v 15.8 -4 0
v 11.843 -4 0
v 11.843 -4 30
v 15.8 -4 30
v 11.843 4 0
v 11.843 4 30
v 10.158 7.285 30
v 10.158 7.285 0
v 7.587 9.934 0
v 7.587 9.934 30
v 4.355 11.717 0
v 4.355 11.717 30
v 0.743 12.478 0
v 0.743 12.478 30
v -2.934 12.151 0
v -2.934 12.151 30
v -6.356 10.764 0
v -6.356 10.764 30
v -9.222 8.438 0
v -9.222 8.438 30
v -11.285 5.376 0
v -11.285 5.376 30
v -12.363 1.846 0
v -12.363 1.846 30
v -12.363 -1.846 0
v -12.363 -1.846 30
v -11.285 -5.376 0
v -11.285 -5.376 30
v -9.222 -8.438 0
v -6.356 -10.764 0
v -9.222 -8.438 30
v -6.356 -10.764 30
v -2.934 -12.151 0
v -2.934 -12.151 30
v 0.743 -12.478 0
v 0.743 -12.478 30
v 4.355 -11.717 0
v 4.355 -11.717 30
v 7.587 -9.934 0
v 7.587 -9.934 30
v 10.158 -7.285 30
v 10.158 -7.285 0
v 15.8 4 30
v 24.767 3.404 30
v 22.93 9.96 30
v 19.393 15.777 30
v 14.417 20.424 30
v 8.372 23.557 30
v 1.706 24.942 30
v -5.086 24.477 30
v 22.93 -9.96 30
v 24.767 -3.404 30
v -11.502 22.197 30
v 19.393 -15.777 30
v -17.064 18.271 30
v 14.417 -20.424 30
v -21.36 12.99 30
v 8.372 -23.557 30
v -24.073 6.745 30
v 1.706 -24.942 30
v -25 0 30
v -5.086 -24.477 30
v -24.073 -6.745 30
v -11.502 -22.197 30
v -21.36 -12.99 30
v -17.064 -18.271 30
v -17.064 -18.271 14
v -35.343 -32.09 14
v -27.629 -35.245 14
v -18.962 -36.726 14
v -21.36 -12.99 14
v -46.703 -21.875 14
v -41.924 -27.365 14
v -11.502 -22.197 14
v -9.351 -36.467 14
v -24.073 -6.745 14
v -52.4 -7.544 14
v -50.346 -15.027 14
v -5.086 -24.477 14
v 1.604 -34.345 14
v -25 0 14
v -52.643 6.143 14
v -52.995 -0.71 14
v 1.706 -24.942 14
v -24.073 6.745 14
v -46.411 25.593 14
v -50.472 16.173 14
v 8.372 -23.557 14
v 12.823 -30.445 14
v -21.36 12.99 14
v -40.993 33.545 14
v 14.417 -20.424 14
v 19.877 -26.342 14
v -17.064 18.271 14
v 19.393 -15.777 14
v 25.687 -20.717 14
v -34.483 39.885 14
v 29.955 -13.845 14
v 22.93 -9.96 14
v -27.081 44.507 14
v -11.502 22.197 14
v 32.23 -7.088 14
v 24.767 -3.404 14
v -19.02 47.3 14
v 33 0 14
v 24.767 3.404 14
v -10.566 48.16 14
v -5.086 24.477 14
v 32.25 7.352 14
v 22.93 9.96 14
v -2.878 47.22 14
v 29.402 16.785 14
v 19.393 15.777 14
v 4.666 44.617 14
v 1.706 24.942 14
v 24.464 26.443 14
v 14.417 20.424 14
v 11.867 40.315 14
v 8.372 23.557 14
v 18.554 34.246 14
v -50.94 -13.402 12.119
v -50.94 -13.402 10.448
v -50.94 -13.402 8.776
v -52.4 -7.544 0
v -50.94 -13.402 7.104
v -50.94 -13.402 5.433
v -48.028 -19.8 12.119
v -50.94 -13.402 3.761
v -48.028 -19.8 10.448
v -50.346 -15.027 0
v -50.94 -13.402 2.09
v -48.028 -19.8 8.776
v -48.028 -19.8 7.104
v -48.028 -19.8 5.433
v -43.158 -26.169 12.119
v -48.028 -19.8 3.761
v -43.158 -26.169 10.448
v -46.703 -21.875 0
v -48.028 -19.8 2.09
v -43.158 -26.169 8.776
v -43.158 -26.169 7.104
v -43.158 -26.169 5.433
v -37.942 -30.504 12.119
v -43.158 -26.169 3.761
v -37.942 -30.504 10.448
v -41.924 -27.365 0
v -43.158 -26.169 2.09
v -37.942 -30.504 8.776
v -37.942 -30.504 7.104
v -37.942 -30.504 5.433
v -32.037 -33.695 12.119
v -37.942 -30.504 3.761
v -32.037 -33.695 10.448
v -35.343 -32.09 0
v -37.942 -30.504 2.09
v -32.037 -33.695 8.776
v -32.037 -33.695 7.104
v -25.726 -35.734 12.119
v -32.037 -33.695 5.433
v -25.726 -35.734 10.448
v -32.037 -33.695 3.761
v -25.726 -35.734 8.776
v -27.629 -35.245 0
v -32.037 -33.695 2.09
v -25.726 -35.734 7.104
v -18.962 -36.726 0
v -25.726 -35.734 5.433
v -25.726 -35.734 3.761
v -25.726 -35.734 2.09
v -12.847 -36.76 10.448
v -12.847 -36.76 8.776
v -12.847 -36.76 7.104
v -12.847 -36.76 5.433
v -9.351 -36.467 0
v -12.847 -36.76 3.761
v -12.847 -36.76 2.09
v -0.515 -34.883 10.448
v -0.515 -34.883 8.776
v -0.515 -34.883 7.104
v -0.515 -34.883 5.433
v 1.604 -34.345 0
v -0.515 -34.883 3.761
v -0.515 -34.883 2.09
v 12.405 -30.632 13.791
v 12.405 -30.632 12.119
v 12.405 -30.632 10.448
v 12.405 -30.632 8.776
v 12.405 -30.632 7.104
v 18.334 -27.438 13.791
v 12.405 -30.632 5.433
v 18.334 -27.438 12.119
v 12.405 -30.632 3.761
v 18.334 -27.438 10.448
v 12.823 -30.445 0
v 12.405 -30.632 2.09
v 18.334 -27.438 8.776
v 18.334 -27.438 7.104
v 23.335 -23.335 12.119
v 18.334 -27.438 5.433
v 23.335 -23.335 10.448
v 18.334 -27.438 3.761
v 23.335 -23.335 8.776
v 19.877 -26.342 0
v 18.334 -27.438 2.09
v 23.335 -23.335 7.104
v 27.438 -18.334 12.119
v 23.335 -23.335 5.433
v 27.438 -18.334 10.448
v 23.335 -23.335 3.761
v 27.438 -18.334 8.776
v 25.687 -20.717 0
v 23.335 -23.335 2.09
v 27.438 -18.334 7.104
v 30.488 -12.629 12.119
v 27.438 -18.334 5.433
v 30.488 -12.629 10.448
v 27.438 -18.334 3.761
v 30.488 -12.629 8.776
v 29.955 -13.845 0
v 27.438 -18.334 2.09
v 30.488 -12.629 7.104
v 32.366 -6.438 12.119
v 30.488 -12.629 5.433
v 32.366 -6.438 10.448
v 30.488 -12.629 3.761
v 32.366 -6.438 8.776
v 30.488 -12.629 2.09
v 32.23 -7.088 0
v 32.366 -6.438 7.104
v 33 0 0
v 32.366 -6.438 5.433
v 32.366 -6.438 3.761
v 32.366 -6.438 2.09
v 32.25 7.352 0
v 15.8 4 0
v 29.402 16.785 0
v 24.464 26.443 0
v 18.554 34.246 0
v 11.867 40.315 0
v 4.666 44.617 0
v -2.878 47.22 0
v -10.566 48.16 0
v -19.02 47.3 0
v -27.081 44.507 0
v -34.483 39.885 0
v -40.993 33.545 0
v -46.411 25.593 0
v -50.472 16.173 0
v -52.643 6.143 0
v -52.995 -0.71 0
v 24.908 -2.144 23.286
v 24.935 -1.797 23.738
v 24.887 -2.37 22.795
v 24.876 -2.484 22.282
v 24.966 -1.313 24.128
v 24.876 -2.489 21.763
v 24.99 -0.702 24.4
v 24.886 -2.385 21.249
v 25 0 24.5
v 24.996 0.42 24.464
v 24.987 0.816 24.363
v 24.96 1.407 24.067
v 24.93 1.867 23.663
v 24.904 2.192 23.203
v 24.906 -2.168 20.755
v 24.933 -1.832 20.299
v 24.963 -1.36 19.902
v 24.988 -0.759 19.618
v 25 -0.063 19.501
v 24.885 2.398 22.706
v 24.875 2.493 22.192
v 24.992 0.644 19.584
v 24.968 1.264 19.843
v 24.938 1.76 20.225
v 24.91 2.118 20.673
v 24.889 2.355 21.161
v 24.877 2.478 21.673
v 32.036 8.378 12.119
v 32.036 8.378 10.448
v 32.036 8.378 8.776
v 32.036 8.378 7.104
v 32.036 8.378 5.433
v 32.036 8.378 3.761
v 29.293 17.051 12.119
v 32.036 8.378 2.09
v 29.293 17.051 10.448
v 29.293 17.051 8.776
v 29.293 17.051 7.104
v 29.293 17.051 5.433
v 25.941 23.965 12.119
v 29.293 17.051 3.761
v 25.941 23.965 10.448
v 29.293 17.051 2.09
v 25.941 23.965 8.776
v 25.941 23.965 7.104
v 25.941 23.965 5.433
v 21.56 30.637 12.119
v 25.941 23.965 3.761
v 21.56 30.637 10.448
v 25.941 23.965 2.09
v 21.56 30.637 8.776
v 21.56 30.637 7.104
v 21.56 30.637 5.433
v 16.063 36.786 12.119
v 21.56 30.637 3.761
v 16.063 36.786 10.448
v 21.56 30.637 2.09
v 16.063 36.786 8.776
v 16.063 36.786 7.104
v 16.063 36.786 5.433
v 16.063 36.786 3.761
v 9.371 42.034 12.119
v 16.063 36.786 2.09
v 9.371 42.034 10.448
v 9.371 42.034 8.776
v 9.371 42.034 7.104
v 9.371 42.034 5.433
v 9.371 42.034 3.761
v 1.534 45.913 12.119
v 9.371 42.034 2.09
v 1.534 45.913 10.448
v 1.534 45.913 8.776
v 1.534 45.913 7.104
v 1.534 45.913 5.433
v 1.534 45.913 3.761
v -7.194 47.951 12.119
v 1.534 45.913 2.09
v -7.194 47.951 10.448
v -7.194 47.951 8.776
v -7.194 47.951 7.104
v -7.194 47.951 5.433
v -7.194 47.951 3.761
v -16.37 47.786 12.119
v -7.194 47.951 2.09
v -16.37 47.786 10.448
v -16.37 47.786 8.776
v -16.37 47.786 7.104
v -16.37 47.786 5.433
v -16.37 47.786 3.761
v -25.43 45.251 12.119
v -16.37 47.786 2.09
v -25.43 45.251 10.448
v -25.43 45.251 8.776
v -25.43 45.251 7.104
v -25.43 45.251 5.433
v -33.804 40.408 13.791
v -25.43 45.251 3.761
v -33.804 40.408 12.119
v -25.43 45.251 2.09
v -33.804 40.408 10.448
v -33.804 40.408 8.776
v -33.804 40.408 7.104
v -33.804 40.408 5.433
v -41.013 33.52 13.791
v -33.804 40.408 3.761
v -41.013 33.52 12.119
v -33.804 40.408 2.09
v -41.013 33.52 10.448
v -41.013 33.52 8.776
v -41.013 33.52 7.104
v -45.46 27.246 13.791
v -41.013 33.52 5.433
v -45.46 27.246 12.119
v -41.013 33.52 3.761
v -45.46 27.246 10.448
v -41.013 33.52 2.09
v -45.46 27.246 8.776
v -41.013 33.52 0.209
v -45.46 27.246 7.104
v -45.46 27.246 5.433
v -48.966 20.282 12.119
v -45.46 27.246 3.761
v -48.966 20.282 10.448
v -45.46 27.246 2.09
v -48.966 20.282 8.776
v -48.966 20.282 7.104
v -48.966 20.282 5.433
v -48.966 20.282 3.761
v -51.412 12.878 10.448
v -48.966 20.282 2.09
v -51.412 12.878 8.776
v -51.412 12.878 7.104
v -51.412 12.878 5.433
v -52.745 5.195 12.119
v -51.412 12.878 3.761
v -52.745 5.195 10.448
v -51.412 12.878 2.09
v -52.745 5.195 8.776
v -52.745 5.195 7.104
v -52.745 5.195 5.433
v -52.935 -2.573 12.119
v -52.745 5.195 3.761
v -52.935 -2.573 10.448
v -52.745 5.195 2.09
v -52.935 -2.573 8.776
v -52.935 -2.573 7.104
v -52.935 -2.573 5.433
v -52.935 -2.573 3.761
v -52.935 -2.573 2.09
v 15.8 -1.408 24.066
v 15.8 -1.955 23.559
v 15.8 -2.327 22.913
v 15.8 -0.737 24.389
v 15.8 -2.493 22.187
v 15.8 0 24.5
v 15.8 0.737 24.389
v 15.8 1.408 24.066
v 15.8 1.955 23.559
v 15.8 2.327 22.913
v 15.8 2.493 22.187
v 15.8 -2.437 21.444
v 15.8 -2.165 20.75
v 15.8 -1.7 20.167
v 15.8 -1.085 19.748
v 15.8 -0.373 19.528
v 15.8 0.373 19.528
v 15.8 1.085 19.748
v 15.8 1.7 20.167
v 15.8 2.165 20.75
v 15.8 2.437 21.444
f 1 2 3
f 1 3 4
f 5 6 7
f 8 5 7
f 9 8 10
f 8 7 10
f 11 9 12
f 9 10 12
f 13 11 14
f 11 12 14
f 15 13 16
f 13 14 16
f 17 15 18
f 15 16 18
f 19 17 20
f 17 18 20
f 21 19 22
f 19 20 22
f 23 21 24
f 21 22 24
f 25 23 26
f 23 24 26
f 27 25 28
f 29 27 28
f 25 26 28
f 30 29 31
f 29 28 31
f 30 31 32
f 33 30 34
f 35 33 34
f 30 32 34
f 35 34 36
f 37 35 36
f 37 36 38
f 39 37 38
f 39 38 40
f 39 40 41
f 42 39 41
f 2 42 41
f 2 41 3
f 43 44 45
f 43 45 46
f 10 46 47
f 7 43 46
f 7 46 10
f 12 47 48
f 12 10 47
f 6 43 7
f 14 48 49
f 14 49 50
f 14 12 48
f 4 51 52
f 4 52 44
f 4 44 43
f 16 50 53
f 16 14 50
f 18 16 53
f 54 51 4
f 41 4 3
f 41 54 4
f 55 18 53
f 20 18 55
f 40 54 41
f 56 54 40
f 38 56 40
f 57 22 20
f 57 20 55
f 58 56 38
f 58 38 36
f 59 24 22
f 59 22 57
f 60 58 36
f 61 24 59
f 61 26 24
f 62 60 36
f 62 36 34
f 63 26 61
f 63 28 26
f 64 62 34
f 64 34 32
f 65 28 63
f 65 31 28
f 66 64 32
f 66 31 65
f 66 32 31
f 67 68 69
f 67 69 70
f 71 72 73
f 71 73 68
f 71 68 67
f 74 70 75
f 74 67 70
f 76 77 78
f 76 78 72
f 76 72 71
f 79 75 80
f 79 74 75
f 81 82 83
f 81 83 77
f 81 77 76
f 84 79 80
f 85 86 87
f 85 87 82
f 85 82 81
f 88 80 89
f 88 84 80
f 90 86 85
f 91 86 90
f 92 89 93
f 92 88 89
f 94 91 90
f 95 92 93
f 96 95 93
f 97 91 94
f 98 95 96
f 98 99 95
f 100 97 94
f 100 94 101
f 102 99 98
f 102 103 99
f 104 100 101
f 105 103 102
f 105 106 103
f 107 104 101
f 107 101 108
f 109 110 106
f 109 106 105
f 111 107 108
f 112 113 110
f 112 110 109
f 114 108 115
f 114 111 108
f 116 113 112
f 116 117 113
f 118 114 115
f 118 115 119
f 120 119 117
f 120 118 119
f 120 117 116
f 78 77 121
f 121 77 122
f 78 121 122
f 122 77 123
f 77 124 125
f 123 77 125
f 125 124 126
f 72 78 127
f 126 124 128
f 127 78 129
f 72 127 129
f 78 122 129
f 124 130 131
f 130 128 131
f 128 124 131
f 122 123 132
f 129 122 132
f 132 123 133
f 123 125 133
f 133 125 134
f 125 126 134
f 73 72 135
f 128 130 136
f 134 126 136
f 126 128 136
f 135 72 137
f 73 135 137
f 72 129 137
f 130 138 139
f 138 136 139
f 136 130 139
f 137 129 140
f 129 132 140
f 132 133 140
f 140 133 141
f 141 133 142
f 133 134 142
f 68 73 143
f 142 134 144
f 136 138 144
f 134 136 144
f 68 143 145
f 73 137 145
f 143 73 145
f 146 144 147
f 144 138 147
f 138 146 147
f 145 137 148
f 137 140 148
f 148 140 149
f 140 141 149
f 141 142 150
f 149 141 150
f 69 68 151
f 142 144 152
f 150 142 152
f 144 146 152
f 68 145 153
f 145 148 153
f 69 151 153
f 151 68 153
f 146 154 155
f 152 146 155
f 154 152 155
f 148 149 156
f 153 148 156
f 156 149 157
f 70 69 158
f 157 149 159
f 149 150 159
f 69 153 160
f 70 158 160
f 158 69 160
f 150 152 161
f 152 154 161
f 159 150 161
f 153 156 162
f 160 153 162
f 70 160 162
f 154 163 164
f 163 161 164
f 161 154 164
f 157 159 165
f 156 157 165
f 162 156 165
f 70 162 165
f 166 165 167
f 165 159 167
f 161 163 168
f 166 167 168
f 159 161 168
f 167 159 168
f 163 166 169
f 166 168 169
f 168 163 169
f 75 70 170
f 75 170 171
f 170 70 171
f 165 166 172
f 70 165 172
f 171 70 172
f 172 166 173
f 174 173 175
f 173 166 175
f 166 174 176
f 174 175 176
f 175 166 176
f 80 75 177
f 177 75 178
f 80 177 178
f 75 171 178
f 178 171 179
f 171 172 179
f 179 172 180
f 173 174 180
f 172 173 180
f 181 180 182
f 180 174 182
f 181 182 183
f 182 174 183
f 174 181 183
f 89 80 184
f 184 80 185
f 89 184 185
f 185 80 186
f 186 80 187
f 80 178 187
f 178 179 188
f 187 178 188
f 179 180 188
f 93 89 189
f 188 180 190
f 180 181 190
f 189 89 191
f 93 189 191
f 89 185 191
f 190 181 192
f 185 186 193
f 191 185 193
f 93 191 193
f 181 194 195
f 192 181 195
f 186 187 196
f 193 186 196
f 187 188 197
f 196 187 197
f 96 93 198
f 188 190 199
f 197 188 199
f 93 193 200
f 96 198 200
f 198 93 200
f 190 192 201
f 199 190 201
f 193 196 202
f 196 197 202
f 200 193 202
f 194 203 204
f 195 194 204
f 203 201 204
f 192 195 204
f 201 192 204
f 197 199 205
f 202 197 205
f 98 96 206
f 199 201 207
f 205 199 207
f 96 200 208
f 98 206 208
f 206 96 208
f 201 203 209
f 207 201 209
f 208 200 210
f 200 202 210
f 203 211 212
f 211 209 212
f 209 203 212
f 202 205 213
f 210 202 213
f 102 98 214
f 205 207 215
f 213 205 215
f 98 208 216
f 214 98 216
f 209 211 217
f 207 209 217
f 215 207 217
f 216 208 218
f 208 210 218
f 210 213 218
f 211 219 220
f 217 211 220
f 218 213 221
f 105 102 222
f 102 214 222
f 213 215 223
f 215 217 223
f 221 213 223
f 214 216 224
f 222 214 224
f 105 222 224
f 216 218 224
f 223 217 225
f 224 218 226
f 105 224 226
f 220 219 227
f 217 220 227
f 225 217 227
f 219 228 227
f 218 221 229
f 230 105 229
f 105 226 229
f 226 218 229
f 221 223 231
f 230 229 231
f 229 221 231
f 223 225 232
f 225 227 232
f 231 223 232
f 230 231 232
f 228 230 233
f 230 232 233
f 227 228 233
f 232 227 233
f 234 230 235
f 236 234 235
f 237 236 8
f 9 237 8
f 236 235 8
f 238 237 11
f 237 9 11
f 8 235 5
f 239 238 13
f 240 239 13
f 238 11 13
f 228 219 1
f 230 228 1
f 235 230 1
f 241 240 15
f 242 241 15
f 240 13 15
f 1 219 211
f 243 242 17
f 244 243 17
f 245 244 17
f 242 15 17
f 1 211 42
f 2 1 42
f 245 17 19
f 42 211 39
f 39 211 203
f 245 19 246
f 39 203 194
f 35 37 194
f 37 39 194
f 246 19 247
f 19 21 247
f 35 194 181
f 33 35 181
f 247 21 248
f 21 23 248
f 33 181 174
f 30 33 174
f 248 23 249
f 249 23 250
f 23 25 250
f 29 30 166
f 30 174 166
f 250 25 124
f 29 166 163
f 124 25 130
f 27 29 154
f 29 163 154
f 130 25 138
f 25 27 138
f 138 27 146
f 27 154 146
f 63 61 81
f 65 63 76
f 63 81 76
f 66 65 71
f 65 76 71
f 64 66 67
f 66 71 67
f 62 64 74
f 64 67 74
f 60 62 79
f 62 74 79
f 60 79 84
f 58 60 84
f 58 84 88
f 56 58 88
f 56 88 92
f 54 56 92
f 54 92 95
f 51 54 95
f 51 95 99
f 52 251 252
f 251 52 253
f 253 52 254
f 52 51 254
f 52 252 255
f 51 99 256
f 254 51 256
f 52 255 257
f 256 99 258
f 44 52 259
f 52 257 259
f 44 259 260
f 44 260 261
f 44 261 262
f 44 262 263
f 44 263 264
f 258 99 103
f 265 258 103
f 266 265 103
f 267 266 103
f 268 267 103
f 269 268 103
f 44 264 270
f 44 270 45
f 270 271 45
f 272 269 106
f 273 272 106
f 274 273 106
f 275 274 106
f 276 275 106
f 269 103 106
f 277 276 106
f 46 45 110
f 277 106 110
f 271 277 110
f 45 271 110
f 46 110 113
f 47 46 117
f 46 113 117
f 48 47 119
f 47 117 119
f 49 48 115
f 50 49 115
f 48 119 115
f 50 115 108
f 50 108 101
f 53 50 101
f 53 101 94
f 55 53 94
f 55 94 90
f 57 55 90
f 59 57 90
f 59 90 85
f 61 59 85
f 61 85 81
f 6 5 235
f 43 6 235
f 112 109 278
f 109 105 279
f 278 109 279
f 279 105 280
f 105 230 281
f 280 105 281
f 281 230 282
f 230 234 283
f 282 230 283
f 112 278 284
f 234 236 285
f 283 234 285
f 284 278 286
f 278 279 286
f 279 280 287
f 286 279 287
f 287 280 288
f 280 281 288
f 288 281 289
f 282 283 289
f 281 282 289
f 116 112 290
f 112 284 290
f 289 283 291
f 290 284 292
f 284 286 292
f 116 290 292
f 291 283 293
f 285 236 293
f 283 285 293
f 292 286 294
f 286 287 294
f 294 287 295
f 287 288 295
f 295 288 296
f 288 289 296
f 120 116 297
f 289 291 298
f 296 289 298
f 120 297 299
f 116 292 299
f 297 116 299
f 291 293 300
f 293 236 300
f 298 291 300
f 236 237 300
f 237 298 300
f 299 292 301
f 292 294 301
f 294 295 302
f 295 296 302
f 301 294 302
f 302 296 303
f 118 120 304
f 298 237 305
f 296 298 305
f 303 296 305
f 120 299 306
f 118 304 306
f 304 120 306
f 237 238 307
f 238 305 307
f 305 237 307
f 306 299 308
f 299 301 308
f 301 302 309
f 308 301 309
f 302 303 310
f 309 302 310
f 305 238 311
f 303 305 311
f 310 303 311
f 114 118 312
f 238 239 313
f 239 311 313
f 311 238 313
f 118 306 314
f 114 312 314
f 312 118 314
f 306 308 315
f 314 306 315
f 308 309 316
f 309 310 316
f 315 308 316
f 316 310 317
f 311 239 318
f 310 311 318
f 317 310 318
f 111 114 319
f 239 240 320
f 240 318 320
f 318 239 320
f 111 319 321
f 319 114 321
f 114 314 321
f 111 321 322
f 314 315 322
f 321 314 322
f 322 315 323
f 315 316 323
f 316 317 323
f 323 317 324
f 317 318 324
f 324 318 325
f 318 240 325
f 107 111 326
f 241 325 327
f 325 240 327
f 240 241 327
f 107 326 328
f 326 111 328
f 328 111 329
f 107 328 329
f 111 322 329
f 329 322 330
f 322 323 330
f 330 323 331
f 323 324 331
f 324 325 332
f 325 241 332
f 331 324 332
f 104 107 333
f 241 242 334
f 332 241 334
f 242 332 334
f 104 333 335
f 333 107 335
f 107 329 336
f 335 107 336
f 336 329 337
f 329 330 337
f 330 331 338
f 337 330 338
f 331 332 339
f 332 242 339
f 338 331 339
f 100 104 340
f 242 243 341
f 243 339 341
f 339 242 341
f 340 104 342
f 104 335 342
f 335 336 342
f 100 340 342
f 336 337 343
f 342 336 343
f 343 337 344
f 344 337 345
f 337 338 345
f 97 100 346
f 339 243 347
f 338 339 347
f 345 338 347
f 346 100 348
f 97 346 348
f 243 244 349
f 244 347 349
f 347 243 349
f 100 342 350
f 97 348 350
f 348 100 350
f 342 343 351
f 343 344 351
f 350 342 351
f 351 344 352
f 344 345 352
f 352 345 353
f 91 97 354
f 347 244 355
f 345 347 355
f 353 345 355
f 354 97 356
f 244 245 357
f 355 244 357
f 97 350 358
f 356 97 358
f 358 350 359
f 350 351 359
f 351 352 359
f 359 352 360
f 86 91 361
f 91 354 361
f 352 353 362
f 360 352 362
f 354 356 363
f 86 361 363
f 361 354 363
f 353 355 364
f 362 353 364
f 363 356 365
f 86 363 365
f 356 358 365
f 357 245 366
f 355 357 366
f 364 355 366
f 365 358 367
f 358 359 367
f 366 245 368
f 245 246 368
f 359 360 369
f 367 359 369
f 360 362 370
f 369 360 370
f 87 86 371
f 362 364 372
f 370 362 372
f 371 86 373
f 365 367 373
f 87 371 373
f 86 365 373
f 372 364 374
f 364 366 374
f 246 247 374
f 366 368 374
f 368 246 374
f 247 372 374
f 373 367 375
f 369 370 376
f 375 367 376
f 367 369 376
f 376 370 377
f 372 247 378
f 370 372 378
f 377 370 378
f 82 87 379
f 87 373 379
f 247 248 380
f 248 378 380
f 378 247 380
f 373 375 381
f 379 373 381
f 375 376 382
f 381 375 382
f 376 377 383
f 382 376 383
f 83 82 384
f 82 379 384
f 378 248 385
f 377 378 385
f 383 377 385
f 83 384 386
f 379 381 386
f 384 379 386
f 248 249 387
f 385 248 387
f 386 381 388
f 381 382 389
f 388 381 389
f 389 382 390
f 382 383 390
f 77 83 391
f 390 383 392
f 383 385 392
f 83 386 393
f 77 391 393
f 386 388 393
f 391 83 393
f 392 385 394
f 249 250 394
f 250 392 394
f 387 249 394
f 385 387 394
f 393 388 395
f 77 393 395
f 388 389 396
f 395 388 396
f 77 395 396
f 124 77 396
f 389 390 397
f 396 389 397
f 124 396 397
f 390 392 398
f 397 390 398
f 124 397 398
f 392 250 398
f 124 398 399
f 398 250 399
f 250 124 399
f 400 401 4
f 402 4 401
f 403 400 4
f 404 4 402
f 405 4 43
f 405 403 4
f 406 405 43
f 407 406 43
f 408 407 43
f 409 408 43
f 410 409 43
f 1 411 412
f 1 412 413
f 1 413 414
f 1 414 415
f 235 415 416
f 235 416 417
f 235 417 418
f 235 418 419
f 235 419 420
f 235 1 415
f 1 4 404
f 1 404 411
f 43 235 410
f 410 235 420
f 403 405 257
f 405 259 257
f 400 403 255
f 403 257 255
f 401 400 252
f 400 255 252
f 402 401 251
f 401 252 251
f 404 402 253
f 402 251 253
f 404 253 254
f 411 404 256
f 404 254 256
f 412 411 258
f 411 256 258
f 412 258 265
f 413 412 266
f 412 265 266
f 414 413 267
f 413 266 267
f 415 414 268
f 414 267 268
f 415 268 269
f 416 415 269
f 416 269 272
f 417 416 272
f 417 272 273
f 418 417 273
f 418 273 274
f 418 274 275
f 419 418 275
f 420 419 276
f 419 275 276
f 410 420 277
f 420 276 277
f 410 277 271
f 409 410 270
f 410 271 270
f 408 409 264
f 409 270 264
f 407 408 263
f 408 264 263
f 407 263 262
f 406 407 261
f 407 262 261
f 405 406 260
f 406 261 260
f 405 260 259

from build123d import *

# Parameters (mm, degrees)
EXTRUDE_1_DEPTH     = 14
SKETCH_2_R          = 25
EXTRUDE_2_DEPTH     = 30
SKETCH_3_R          = 12.5
CUT_EXTRUDE_1_DEPTH = 78.64562782
SWEEP_2_PROFILE_R   = 2.5
SKETCH_8_W          = 15.8
SKETCH_8_H          = 8
CUT_EXTRUDE_3_DEPTH = 78.64562782


with BuildPart() as part:
    # 草图1 → 凸台-拉伸1 (new body)
    with BuildSketch(Plane.XY):
        with BuildLine():
            add(Edge.make_bspline(
                [(33, 0), (32.992204895, 0.544666729), (32.976480109, 1.643403319), (32.853064931, 3.301727765), (32.658915426, 4.980879695), (32.388196689, 6.677537715), (32.044944958, 8.388606268), (31.630570565, 10.111165253), (31.147186794, 11.842433965), (30.596568938, 13.57971361), (29.98033344, 15.320337013), (29.299789777, 17.061615147), (28.555887029, 18.800784535), (27.749173646, 20.534967231), (26.879751228, 22.261119957), (25.947286594, 23.976001144), (24.951020471, 25.676125073), (23.889814679, 27.35772059), (22.762223009, 29.016688558), (21.566586312, 30.648565024), (20.301138192, 32.248479161), (18.964127555, 33.81112609), (17.553956129, 35.330754232), (16.069306796, 36.801162963), (14.509273248, 38.215722303), (12.873484417, 39.567416225), (11.162207045, 40.848898292), (9.376441015, 42.052578226), (7.517986505, 43.170717712), (5.589490091, 44.195539218), (3.594469744, 45.119346278), (1.53731504, 45.934646153), (-0.576735961, 46.634276616), (-2.74164203, 47.211518041), (-4.950619716, 47.660204084), (-7.196219851, 47.974828288), (-9.470422571, 48.150607487), (-11.76473259, 48.183580117), (-14.070288761, 48.070629868), (-16.377971366, 47.809547695), (-18.67851562, 47.399040683), (-20.96262116, 46.838742341), (-23.221064088, 46.12921357), (-25.444800735, 45.271912976), (-27.625072088, 44.269170741), (-29.753502784, 43.124146476), (-31.822186889, 41.840759247), (-33.823775568, 40.423630812), (-35.751543622, 38.877994203), (-37.599456194, 37.209613013), (-39.362201277, 35.424668235), (-41.035231852, 33.529668236), (-42.614754199, 31.53132517), (-44.09777446, 29.436479773), (-45.481085646, 27.253115728), (-46.760721786, 24.993714386), (-47.930689696, 22.669528818), (-48.985280232, 20.290366962), (-49.921879744, 17.86233444), (-50.73821056, 15.391267947), (-51.432305812, 12.8831224), (-52.002502766, 10.343940159), (-52.447402955, 7.779839842), (-52.766015438, 5.196990334), (-52.957281079, 2.601648936), (-53.021584789, 0.009188241), (-52.95682309, -2.556762808), (-52.768752296, -5.077096398), (-52.522148692, -6.726622939), (-52.399929, -7.544148)],
                knots=[0, 0, 0, 0, 0.010895628, 0.021979359, 0.033249847, 0.044704843, 0.056341204, 0.068154912, 0.080141086, 0.092294104, 0.104607701, 0.11707519, 0.129689707, 0.14244447, 0.155333078, 0.168349762, 0.181489545, 0.194748369, 0.208123105, 0.221611441, 0.235211792, 0.248923032, 0.26274432, 0.276674885, 0.290713819, 0.304859987, 0.319111923, 0.333467808, 0.347925543, 0.362482829, 0.377137264, 0.391886521, 0.406728484, 0.421661423, 0.436684102, 0.451795886, 0.466996829, 0.482287719, 0.497670025, 0.513145895, 0.528718049, 0.54438967, 0.560164277, 0.576045576, 0.592037302, 0.608143104, 0.624366387, 0.640710242, 0.657177353, 0.673769958, 0.690489849, 0.70733837, 0.724316458, 0.741424727, 0.758663496, 0.776003856, 0.793351474, 0.810699088, 0.828046707, 0.845394323, 0.862741936, 0.880089557, 0.897437174, 0.914784793, 0.932132405, 0.949480024, 0.966642526, 0.983467637, 1, 1, 1, 1], degree=3))
            add(Edge.make_bspline(
                [(-52.399929, -7.544148), (-52.251447511, -8.344449933), (-51.956477891, -9.93430977), (-51.431378847, -11.881327743), (-50.946615492, -13.402352601), (-50.547774852, -14.520833098), (-50.113968755, -15.61972104), (-49.645210909, -16.698158038), (-49.141976069, -17.755310038), (-48.604716766, -18.790320175), (-48.033993716, -19.80233339), (-47.430434687, -20.790495875), (-46.794737646, -21.753963168), (-46.127681435, -22.691905033), (-45.430091118, -23.603527112), (-44.461690461, -24.78142675), (-43.179240858, -26.184980253), (-41.532569131, -27.753864704), (-39.788936475, -29.201085533), (-37.95827815, -30.522875718), (-36.050936512, -31.716585493), (-34.077553488, -32.780697635), (-32.048834528, -33.714886161), (-29.975350706, -34.520036776), (-27.867326416, -35.19822348), (-25.734442747, -35.752653633), (-23.585659114, -36.187574089), (-21.429063355, -36.50814968), (-19.27176002, -36.720310246), (-17.119804246, -36.830595085), (-14.978186003, -36.845970949), (-12.850873113, -36.773654705), (-10.740913687, -36.620937922), (-8.650597875, -36.395022526), (-6.581674525, -36.102863407), (-4.535611161, -35.751026937), (-2.513887786, -35.345556209), (-0.518293788, -34.891856115), (1.448781863, -34.394574738), (3.384105738, -33.857530642), (5.283395004, -33.283637208), (7.141181014, -32.67491492), (8.950717416, -32.03256093), (10.703916152, -31.357116), (12.391331701, -30.648817619), (14.002048983, -29.907900792), (15.525340793, -29.134972637), (16.967203751, -28.319820567), (18.341157037, -27.449470169), (19.665980256, -26.516508819), (20.943385245, -25.51958757), (22.170348028, -24.461209886), (23.343896741, -23.343896621), (24.461208994, -22.170347615), (25.519591016, -20.943387015), (26.516495927, -19.665973587), (27.449518295, -18.341181942), (28.316413718, -16.972205388), (29.115091885, -15.562340777), (29.843629808, -14.114985263), (30.500271052, -12.633625806), (31.083435636, -11.121830348), (31.591710671, -9.583242061), (32.023907296, -8.021566688), (32.37884622, -6.440566847), (32.656192002, -4.844051032), (32.853335771, -3.23586502), (32.977041039, -1.619883695), (32.992347014, -0.539961135), (33, 0)],
                knots=[0, 0, 0, 0, 0.020431005, 0.040587725, 0.050576924, 0.060511834, 0.070396638, 0.08023526, 0.09003139, 0.099788458, 0.109509648, 0.119197921, 0.128855969, 0.138486254, 0.14809097, 0.157672096, 0.176767364, 0.195785952, 0.214735199, 0.233619037, 0.252438345, 0.271191379, 0.289874288, 0.308481685, 0.327007235, 0.345444275, 0.363786425, 0.382028051, 0.400164732, 0.418193505, 0.436112913, 0.453922863, 0.47162413, 0.489217593, 0.50670321, 0.524078705, 0.54133817, 0.558470582, 0.575458641, 0.592277781, 0.60889569, 0.625272245, 0.641359738, 0.657103167, 0.672440382, 0.687301883, 0.701610051, 0.715317718, 0.728874017, 0.74243031, 0.75598661, 0.769542915, 0.783099211, 0.796655507, 0.810211812, 0.823768112, 0.837324405, 0.850880704, 0.86443701, 0.877993308, 0.891549609, 0.905105906, 0.918662207, 0.932218502, 0.945774799, 0.959331099, 0.972887398, 0.986443703, 1, 1, 1, 1], degree=3))
        make_face()
    extrude(amount=EXTRUDE_1_DEPTH)

    # 草图2 → 凸台-拉伸2 (add)
    with BuildSketch(Plane.XY):
        with Locations(Location((0, 0, 0), (0, 0, 180))):
            Circle(SKETCH_2_R)
    extrude(amount=EXTRUDE_2_DEPTH)

    # 草图3 → 切除-拉伸1 (cut, through all)
    with BuildSketch(Plane.XY.offset(30)):
        Circle(SKETCH_3_R)
    extrude(amount=-CUT_EXTRUDE_1_DEPTH, mode=Mode.SUBTRACT)

    # 切除-扫描2: sweep along a curve in space
    with BuildLine() as sweep_2_path:
        Line((0, 0, 22), (27, 0, 22))
    # 切除-扫描2 profile (on start of the path) → 切除-扫描2 (sweep, cut)
    with BuildSketch(Plane(origin=(0, 0, 22), x_dir=(0, 0, 1), z_dir=(1, 0, 0))):
        Circle(SWEEP_2_PROFILE_R)
    sweep(path=sweep_2_path.line, mode=Mode.SUBTRACT)

    # 草图8 → 切除-拉伸3 (cut, through all)
    with BuildSketch(Plane.XY):
        with Locations((7.9, 0)):
            Rectangle(SKETCH_8_W, SKETCH_8_H)
    extrude(amount=CUT_EXTRUDE_3_DEPTH, mode=Mode.SUBTRACT)


solid = part.part
